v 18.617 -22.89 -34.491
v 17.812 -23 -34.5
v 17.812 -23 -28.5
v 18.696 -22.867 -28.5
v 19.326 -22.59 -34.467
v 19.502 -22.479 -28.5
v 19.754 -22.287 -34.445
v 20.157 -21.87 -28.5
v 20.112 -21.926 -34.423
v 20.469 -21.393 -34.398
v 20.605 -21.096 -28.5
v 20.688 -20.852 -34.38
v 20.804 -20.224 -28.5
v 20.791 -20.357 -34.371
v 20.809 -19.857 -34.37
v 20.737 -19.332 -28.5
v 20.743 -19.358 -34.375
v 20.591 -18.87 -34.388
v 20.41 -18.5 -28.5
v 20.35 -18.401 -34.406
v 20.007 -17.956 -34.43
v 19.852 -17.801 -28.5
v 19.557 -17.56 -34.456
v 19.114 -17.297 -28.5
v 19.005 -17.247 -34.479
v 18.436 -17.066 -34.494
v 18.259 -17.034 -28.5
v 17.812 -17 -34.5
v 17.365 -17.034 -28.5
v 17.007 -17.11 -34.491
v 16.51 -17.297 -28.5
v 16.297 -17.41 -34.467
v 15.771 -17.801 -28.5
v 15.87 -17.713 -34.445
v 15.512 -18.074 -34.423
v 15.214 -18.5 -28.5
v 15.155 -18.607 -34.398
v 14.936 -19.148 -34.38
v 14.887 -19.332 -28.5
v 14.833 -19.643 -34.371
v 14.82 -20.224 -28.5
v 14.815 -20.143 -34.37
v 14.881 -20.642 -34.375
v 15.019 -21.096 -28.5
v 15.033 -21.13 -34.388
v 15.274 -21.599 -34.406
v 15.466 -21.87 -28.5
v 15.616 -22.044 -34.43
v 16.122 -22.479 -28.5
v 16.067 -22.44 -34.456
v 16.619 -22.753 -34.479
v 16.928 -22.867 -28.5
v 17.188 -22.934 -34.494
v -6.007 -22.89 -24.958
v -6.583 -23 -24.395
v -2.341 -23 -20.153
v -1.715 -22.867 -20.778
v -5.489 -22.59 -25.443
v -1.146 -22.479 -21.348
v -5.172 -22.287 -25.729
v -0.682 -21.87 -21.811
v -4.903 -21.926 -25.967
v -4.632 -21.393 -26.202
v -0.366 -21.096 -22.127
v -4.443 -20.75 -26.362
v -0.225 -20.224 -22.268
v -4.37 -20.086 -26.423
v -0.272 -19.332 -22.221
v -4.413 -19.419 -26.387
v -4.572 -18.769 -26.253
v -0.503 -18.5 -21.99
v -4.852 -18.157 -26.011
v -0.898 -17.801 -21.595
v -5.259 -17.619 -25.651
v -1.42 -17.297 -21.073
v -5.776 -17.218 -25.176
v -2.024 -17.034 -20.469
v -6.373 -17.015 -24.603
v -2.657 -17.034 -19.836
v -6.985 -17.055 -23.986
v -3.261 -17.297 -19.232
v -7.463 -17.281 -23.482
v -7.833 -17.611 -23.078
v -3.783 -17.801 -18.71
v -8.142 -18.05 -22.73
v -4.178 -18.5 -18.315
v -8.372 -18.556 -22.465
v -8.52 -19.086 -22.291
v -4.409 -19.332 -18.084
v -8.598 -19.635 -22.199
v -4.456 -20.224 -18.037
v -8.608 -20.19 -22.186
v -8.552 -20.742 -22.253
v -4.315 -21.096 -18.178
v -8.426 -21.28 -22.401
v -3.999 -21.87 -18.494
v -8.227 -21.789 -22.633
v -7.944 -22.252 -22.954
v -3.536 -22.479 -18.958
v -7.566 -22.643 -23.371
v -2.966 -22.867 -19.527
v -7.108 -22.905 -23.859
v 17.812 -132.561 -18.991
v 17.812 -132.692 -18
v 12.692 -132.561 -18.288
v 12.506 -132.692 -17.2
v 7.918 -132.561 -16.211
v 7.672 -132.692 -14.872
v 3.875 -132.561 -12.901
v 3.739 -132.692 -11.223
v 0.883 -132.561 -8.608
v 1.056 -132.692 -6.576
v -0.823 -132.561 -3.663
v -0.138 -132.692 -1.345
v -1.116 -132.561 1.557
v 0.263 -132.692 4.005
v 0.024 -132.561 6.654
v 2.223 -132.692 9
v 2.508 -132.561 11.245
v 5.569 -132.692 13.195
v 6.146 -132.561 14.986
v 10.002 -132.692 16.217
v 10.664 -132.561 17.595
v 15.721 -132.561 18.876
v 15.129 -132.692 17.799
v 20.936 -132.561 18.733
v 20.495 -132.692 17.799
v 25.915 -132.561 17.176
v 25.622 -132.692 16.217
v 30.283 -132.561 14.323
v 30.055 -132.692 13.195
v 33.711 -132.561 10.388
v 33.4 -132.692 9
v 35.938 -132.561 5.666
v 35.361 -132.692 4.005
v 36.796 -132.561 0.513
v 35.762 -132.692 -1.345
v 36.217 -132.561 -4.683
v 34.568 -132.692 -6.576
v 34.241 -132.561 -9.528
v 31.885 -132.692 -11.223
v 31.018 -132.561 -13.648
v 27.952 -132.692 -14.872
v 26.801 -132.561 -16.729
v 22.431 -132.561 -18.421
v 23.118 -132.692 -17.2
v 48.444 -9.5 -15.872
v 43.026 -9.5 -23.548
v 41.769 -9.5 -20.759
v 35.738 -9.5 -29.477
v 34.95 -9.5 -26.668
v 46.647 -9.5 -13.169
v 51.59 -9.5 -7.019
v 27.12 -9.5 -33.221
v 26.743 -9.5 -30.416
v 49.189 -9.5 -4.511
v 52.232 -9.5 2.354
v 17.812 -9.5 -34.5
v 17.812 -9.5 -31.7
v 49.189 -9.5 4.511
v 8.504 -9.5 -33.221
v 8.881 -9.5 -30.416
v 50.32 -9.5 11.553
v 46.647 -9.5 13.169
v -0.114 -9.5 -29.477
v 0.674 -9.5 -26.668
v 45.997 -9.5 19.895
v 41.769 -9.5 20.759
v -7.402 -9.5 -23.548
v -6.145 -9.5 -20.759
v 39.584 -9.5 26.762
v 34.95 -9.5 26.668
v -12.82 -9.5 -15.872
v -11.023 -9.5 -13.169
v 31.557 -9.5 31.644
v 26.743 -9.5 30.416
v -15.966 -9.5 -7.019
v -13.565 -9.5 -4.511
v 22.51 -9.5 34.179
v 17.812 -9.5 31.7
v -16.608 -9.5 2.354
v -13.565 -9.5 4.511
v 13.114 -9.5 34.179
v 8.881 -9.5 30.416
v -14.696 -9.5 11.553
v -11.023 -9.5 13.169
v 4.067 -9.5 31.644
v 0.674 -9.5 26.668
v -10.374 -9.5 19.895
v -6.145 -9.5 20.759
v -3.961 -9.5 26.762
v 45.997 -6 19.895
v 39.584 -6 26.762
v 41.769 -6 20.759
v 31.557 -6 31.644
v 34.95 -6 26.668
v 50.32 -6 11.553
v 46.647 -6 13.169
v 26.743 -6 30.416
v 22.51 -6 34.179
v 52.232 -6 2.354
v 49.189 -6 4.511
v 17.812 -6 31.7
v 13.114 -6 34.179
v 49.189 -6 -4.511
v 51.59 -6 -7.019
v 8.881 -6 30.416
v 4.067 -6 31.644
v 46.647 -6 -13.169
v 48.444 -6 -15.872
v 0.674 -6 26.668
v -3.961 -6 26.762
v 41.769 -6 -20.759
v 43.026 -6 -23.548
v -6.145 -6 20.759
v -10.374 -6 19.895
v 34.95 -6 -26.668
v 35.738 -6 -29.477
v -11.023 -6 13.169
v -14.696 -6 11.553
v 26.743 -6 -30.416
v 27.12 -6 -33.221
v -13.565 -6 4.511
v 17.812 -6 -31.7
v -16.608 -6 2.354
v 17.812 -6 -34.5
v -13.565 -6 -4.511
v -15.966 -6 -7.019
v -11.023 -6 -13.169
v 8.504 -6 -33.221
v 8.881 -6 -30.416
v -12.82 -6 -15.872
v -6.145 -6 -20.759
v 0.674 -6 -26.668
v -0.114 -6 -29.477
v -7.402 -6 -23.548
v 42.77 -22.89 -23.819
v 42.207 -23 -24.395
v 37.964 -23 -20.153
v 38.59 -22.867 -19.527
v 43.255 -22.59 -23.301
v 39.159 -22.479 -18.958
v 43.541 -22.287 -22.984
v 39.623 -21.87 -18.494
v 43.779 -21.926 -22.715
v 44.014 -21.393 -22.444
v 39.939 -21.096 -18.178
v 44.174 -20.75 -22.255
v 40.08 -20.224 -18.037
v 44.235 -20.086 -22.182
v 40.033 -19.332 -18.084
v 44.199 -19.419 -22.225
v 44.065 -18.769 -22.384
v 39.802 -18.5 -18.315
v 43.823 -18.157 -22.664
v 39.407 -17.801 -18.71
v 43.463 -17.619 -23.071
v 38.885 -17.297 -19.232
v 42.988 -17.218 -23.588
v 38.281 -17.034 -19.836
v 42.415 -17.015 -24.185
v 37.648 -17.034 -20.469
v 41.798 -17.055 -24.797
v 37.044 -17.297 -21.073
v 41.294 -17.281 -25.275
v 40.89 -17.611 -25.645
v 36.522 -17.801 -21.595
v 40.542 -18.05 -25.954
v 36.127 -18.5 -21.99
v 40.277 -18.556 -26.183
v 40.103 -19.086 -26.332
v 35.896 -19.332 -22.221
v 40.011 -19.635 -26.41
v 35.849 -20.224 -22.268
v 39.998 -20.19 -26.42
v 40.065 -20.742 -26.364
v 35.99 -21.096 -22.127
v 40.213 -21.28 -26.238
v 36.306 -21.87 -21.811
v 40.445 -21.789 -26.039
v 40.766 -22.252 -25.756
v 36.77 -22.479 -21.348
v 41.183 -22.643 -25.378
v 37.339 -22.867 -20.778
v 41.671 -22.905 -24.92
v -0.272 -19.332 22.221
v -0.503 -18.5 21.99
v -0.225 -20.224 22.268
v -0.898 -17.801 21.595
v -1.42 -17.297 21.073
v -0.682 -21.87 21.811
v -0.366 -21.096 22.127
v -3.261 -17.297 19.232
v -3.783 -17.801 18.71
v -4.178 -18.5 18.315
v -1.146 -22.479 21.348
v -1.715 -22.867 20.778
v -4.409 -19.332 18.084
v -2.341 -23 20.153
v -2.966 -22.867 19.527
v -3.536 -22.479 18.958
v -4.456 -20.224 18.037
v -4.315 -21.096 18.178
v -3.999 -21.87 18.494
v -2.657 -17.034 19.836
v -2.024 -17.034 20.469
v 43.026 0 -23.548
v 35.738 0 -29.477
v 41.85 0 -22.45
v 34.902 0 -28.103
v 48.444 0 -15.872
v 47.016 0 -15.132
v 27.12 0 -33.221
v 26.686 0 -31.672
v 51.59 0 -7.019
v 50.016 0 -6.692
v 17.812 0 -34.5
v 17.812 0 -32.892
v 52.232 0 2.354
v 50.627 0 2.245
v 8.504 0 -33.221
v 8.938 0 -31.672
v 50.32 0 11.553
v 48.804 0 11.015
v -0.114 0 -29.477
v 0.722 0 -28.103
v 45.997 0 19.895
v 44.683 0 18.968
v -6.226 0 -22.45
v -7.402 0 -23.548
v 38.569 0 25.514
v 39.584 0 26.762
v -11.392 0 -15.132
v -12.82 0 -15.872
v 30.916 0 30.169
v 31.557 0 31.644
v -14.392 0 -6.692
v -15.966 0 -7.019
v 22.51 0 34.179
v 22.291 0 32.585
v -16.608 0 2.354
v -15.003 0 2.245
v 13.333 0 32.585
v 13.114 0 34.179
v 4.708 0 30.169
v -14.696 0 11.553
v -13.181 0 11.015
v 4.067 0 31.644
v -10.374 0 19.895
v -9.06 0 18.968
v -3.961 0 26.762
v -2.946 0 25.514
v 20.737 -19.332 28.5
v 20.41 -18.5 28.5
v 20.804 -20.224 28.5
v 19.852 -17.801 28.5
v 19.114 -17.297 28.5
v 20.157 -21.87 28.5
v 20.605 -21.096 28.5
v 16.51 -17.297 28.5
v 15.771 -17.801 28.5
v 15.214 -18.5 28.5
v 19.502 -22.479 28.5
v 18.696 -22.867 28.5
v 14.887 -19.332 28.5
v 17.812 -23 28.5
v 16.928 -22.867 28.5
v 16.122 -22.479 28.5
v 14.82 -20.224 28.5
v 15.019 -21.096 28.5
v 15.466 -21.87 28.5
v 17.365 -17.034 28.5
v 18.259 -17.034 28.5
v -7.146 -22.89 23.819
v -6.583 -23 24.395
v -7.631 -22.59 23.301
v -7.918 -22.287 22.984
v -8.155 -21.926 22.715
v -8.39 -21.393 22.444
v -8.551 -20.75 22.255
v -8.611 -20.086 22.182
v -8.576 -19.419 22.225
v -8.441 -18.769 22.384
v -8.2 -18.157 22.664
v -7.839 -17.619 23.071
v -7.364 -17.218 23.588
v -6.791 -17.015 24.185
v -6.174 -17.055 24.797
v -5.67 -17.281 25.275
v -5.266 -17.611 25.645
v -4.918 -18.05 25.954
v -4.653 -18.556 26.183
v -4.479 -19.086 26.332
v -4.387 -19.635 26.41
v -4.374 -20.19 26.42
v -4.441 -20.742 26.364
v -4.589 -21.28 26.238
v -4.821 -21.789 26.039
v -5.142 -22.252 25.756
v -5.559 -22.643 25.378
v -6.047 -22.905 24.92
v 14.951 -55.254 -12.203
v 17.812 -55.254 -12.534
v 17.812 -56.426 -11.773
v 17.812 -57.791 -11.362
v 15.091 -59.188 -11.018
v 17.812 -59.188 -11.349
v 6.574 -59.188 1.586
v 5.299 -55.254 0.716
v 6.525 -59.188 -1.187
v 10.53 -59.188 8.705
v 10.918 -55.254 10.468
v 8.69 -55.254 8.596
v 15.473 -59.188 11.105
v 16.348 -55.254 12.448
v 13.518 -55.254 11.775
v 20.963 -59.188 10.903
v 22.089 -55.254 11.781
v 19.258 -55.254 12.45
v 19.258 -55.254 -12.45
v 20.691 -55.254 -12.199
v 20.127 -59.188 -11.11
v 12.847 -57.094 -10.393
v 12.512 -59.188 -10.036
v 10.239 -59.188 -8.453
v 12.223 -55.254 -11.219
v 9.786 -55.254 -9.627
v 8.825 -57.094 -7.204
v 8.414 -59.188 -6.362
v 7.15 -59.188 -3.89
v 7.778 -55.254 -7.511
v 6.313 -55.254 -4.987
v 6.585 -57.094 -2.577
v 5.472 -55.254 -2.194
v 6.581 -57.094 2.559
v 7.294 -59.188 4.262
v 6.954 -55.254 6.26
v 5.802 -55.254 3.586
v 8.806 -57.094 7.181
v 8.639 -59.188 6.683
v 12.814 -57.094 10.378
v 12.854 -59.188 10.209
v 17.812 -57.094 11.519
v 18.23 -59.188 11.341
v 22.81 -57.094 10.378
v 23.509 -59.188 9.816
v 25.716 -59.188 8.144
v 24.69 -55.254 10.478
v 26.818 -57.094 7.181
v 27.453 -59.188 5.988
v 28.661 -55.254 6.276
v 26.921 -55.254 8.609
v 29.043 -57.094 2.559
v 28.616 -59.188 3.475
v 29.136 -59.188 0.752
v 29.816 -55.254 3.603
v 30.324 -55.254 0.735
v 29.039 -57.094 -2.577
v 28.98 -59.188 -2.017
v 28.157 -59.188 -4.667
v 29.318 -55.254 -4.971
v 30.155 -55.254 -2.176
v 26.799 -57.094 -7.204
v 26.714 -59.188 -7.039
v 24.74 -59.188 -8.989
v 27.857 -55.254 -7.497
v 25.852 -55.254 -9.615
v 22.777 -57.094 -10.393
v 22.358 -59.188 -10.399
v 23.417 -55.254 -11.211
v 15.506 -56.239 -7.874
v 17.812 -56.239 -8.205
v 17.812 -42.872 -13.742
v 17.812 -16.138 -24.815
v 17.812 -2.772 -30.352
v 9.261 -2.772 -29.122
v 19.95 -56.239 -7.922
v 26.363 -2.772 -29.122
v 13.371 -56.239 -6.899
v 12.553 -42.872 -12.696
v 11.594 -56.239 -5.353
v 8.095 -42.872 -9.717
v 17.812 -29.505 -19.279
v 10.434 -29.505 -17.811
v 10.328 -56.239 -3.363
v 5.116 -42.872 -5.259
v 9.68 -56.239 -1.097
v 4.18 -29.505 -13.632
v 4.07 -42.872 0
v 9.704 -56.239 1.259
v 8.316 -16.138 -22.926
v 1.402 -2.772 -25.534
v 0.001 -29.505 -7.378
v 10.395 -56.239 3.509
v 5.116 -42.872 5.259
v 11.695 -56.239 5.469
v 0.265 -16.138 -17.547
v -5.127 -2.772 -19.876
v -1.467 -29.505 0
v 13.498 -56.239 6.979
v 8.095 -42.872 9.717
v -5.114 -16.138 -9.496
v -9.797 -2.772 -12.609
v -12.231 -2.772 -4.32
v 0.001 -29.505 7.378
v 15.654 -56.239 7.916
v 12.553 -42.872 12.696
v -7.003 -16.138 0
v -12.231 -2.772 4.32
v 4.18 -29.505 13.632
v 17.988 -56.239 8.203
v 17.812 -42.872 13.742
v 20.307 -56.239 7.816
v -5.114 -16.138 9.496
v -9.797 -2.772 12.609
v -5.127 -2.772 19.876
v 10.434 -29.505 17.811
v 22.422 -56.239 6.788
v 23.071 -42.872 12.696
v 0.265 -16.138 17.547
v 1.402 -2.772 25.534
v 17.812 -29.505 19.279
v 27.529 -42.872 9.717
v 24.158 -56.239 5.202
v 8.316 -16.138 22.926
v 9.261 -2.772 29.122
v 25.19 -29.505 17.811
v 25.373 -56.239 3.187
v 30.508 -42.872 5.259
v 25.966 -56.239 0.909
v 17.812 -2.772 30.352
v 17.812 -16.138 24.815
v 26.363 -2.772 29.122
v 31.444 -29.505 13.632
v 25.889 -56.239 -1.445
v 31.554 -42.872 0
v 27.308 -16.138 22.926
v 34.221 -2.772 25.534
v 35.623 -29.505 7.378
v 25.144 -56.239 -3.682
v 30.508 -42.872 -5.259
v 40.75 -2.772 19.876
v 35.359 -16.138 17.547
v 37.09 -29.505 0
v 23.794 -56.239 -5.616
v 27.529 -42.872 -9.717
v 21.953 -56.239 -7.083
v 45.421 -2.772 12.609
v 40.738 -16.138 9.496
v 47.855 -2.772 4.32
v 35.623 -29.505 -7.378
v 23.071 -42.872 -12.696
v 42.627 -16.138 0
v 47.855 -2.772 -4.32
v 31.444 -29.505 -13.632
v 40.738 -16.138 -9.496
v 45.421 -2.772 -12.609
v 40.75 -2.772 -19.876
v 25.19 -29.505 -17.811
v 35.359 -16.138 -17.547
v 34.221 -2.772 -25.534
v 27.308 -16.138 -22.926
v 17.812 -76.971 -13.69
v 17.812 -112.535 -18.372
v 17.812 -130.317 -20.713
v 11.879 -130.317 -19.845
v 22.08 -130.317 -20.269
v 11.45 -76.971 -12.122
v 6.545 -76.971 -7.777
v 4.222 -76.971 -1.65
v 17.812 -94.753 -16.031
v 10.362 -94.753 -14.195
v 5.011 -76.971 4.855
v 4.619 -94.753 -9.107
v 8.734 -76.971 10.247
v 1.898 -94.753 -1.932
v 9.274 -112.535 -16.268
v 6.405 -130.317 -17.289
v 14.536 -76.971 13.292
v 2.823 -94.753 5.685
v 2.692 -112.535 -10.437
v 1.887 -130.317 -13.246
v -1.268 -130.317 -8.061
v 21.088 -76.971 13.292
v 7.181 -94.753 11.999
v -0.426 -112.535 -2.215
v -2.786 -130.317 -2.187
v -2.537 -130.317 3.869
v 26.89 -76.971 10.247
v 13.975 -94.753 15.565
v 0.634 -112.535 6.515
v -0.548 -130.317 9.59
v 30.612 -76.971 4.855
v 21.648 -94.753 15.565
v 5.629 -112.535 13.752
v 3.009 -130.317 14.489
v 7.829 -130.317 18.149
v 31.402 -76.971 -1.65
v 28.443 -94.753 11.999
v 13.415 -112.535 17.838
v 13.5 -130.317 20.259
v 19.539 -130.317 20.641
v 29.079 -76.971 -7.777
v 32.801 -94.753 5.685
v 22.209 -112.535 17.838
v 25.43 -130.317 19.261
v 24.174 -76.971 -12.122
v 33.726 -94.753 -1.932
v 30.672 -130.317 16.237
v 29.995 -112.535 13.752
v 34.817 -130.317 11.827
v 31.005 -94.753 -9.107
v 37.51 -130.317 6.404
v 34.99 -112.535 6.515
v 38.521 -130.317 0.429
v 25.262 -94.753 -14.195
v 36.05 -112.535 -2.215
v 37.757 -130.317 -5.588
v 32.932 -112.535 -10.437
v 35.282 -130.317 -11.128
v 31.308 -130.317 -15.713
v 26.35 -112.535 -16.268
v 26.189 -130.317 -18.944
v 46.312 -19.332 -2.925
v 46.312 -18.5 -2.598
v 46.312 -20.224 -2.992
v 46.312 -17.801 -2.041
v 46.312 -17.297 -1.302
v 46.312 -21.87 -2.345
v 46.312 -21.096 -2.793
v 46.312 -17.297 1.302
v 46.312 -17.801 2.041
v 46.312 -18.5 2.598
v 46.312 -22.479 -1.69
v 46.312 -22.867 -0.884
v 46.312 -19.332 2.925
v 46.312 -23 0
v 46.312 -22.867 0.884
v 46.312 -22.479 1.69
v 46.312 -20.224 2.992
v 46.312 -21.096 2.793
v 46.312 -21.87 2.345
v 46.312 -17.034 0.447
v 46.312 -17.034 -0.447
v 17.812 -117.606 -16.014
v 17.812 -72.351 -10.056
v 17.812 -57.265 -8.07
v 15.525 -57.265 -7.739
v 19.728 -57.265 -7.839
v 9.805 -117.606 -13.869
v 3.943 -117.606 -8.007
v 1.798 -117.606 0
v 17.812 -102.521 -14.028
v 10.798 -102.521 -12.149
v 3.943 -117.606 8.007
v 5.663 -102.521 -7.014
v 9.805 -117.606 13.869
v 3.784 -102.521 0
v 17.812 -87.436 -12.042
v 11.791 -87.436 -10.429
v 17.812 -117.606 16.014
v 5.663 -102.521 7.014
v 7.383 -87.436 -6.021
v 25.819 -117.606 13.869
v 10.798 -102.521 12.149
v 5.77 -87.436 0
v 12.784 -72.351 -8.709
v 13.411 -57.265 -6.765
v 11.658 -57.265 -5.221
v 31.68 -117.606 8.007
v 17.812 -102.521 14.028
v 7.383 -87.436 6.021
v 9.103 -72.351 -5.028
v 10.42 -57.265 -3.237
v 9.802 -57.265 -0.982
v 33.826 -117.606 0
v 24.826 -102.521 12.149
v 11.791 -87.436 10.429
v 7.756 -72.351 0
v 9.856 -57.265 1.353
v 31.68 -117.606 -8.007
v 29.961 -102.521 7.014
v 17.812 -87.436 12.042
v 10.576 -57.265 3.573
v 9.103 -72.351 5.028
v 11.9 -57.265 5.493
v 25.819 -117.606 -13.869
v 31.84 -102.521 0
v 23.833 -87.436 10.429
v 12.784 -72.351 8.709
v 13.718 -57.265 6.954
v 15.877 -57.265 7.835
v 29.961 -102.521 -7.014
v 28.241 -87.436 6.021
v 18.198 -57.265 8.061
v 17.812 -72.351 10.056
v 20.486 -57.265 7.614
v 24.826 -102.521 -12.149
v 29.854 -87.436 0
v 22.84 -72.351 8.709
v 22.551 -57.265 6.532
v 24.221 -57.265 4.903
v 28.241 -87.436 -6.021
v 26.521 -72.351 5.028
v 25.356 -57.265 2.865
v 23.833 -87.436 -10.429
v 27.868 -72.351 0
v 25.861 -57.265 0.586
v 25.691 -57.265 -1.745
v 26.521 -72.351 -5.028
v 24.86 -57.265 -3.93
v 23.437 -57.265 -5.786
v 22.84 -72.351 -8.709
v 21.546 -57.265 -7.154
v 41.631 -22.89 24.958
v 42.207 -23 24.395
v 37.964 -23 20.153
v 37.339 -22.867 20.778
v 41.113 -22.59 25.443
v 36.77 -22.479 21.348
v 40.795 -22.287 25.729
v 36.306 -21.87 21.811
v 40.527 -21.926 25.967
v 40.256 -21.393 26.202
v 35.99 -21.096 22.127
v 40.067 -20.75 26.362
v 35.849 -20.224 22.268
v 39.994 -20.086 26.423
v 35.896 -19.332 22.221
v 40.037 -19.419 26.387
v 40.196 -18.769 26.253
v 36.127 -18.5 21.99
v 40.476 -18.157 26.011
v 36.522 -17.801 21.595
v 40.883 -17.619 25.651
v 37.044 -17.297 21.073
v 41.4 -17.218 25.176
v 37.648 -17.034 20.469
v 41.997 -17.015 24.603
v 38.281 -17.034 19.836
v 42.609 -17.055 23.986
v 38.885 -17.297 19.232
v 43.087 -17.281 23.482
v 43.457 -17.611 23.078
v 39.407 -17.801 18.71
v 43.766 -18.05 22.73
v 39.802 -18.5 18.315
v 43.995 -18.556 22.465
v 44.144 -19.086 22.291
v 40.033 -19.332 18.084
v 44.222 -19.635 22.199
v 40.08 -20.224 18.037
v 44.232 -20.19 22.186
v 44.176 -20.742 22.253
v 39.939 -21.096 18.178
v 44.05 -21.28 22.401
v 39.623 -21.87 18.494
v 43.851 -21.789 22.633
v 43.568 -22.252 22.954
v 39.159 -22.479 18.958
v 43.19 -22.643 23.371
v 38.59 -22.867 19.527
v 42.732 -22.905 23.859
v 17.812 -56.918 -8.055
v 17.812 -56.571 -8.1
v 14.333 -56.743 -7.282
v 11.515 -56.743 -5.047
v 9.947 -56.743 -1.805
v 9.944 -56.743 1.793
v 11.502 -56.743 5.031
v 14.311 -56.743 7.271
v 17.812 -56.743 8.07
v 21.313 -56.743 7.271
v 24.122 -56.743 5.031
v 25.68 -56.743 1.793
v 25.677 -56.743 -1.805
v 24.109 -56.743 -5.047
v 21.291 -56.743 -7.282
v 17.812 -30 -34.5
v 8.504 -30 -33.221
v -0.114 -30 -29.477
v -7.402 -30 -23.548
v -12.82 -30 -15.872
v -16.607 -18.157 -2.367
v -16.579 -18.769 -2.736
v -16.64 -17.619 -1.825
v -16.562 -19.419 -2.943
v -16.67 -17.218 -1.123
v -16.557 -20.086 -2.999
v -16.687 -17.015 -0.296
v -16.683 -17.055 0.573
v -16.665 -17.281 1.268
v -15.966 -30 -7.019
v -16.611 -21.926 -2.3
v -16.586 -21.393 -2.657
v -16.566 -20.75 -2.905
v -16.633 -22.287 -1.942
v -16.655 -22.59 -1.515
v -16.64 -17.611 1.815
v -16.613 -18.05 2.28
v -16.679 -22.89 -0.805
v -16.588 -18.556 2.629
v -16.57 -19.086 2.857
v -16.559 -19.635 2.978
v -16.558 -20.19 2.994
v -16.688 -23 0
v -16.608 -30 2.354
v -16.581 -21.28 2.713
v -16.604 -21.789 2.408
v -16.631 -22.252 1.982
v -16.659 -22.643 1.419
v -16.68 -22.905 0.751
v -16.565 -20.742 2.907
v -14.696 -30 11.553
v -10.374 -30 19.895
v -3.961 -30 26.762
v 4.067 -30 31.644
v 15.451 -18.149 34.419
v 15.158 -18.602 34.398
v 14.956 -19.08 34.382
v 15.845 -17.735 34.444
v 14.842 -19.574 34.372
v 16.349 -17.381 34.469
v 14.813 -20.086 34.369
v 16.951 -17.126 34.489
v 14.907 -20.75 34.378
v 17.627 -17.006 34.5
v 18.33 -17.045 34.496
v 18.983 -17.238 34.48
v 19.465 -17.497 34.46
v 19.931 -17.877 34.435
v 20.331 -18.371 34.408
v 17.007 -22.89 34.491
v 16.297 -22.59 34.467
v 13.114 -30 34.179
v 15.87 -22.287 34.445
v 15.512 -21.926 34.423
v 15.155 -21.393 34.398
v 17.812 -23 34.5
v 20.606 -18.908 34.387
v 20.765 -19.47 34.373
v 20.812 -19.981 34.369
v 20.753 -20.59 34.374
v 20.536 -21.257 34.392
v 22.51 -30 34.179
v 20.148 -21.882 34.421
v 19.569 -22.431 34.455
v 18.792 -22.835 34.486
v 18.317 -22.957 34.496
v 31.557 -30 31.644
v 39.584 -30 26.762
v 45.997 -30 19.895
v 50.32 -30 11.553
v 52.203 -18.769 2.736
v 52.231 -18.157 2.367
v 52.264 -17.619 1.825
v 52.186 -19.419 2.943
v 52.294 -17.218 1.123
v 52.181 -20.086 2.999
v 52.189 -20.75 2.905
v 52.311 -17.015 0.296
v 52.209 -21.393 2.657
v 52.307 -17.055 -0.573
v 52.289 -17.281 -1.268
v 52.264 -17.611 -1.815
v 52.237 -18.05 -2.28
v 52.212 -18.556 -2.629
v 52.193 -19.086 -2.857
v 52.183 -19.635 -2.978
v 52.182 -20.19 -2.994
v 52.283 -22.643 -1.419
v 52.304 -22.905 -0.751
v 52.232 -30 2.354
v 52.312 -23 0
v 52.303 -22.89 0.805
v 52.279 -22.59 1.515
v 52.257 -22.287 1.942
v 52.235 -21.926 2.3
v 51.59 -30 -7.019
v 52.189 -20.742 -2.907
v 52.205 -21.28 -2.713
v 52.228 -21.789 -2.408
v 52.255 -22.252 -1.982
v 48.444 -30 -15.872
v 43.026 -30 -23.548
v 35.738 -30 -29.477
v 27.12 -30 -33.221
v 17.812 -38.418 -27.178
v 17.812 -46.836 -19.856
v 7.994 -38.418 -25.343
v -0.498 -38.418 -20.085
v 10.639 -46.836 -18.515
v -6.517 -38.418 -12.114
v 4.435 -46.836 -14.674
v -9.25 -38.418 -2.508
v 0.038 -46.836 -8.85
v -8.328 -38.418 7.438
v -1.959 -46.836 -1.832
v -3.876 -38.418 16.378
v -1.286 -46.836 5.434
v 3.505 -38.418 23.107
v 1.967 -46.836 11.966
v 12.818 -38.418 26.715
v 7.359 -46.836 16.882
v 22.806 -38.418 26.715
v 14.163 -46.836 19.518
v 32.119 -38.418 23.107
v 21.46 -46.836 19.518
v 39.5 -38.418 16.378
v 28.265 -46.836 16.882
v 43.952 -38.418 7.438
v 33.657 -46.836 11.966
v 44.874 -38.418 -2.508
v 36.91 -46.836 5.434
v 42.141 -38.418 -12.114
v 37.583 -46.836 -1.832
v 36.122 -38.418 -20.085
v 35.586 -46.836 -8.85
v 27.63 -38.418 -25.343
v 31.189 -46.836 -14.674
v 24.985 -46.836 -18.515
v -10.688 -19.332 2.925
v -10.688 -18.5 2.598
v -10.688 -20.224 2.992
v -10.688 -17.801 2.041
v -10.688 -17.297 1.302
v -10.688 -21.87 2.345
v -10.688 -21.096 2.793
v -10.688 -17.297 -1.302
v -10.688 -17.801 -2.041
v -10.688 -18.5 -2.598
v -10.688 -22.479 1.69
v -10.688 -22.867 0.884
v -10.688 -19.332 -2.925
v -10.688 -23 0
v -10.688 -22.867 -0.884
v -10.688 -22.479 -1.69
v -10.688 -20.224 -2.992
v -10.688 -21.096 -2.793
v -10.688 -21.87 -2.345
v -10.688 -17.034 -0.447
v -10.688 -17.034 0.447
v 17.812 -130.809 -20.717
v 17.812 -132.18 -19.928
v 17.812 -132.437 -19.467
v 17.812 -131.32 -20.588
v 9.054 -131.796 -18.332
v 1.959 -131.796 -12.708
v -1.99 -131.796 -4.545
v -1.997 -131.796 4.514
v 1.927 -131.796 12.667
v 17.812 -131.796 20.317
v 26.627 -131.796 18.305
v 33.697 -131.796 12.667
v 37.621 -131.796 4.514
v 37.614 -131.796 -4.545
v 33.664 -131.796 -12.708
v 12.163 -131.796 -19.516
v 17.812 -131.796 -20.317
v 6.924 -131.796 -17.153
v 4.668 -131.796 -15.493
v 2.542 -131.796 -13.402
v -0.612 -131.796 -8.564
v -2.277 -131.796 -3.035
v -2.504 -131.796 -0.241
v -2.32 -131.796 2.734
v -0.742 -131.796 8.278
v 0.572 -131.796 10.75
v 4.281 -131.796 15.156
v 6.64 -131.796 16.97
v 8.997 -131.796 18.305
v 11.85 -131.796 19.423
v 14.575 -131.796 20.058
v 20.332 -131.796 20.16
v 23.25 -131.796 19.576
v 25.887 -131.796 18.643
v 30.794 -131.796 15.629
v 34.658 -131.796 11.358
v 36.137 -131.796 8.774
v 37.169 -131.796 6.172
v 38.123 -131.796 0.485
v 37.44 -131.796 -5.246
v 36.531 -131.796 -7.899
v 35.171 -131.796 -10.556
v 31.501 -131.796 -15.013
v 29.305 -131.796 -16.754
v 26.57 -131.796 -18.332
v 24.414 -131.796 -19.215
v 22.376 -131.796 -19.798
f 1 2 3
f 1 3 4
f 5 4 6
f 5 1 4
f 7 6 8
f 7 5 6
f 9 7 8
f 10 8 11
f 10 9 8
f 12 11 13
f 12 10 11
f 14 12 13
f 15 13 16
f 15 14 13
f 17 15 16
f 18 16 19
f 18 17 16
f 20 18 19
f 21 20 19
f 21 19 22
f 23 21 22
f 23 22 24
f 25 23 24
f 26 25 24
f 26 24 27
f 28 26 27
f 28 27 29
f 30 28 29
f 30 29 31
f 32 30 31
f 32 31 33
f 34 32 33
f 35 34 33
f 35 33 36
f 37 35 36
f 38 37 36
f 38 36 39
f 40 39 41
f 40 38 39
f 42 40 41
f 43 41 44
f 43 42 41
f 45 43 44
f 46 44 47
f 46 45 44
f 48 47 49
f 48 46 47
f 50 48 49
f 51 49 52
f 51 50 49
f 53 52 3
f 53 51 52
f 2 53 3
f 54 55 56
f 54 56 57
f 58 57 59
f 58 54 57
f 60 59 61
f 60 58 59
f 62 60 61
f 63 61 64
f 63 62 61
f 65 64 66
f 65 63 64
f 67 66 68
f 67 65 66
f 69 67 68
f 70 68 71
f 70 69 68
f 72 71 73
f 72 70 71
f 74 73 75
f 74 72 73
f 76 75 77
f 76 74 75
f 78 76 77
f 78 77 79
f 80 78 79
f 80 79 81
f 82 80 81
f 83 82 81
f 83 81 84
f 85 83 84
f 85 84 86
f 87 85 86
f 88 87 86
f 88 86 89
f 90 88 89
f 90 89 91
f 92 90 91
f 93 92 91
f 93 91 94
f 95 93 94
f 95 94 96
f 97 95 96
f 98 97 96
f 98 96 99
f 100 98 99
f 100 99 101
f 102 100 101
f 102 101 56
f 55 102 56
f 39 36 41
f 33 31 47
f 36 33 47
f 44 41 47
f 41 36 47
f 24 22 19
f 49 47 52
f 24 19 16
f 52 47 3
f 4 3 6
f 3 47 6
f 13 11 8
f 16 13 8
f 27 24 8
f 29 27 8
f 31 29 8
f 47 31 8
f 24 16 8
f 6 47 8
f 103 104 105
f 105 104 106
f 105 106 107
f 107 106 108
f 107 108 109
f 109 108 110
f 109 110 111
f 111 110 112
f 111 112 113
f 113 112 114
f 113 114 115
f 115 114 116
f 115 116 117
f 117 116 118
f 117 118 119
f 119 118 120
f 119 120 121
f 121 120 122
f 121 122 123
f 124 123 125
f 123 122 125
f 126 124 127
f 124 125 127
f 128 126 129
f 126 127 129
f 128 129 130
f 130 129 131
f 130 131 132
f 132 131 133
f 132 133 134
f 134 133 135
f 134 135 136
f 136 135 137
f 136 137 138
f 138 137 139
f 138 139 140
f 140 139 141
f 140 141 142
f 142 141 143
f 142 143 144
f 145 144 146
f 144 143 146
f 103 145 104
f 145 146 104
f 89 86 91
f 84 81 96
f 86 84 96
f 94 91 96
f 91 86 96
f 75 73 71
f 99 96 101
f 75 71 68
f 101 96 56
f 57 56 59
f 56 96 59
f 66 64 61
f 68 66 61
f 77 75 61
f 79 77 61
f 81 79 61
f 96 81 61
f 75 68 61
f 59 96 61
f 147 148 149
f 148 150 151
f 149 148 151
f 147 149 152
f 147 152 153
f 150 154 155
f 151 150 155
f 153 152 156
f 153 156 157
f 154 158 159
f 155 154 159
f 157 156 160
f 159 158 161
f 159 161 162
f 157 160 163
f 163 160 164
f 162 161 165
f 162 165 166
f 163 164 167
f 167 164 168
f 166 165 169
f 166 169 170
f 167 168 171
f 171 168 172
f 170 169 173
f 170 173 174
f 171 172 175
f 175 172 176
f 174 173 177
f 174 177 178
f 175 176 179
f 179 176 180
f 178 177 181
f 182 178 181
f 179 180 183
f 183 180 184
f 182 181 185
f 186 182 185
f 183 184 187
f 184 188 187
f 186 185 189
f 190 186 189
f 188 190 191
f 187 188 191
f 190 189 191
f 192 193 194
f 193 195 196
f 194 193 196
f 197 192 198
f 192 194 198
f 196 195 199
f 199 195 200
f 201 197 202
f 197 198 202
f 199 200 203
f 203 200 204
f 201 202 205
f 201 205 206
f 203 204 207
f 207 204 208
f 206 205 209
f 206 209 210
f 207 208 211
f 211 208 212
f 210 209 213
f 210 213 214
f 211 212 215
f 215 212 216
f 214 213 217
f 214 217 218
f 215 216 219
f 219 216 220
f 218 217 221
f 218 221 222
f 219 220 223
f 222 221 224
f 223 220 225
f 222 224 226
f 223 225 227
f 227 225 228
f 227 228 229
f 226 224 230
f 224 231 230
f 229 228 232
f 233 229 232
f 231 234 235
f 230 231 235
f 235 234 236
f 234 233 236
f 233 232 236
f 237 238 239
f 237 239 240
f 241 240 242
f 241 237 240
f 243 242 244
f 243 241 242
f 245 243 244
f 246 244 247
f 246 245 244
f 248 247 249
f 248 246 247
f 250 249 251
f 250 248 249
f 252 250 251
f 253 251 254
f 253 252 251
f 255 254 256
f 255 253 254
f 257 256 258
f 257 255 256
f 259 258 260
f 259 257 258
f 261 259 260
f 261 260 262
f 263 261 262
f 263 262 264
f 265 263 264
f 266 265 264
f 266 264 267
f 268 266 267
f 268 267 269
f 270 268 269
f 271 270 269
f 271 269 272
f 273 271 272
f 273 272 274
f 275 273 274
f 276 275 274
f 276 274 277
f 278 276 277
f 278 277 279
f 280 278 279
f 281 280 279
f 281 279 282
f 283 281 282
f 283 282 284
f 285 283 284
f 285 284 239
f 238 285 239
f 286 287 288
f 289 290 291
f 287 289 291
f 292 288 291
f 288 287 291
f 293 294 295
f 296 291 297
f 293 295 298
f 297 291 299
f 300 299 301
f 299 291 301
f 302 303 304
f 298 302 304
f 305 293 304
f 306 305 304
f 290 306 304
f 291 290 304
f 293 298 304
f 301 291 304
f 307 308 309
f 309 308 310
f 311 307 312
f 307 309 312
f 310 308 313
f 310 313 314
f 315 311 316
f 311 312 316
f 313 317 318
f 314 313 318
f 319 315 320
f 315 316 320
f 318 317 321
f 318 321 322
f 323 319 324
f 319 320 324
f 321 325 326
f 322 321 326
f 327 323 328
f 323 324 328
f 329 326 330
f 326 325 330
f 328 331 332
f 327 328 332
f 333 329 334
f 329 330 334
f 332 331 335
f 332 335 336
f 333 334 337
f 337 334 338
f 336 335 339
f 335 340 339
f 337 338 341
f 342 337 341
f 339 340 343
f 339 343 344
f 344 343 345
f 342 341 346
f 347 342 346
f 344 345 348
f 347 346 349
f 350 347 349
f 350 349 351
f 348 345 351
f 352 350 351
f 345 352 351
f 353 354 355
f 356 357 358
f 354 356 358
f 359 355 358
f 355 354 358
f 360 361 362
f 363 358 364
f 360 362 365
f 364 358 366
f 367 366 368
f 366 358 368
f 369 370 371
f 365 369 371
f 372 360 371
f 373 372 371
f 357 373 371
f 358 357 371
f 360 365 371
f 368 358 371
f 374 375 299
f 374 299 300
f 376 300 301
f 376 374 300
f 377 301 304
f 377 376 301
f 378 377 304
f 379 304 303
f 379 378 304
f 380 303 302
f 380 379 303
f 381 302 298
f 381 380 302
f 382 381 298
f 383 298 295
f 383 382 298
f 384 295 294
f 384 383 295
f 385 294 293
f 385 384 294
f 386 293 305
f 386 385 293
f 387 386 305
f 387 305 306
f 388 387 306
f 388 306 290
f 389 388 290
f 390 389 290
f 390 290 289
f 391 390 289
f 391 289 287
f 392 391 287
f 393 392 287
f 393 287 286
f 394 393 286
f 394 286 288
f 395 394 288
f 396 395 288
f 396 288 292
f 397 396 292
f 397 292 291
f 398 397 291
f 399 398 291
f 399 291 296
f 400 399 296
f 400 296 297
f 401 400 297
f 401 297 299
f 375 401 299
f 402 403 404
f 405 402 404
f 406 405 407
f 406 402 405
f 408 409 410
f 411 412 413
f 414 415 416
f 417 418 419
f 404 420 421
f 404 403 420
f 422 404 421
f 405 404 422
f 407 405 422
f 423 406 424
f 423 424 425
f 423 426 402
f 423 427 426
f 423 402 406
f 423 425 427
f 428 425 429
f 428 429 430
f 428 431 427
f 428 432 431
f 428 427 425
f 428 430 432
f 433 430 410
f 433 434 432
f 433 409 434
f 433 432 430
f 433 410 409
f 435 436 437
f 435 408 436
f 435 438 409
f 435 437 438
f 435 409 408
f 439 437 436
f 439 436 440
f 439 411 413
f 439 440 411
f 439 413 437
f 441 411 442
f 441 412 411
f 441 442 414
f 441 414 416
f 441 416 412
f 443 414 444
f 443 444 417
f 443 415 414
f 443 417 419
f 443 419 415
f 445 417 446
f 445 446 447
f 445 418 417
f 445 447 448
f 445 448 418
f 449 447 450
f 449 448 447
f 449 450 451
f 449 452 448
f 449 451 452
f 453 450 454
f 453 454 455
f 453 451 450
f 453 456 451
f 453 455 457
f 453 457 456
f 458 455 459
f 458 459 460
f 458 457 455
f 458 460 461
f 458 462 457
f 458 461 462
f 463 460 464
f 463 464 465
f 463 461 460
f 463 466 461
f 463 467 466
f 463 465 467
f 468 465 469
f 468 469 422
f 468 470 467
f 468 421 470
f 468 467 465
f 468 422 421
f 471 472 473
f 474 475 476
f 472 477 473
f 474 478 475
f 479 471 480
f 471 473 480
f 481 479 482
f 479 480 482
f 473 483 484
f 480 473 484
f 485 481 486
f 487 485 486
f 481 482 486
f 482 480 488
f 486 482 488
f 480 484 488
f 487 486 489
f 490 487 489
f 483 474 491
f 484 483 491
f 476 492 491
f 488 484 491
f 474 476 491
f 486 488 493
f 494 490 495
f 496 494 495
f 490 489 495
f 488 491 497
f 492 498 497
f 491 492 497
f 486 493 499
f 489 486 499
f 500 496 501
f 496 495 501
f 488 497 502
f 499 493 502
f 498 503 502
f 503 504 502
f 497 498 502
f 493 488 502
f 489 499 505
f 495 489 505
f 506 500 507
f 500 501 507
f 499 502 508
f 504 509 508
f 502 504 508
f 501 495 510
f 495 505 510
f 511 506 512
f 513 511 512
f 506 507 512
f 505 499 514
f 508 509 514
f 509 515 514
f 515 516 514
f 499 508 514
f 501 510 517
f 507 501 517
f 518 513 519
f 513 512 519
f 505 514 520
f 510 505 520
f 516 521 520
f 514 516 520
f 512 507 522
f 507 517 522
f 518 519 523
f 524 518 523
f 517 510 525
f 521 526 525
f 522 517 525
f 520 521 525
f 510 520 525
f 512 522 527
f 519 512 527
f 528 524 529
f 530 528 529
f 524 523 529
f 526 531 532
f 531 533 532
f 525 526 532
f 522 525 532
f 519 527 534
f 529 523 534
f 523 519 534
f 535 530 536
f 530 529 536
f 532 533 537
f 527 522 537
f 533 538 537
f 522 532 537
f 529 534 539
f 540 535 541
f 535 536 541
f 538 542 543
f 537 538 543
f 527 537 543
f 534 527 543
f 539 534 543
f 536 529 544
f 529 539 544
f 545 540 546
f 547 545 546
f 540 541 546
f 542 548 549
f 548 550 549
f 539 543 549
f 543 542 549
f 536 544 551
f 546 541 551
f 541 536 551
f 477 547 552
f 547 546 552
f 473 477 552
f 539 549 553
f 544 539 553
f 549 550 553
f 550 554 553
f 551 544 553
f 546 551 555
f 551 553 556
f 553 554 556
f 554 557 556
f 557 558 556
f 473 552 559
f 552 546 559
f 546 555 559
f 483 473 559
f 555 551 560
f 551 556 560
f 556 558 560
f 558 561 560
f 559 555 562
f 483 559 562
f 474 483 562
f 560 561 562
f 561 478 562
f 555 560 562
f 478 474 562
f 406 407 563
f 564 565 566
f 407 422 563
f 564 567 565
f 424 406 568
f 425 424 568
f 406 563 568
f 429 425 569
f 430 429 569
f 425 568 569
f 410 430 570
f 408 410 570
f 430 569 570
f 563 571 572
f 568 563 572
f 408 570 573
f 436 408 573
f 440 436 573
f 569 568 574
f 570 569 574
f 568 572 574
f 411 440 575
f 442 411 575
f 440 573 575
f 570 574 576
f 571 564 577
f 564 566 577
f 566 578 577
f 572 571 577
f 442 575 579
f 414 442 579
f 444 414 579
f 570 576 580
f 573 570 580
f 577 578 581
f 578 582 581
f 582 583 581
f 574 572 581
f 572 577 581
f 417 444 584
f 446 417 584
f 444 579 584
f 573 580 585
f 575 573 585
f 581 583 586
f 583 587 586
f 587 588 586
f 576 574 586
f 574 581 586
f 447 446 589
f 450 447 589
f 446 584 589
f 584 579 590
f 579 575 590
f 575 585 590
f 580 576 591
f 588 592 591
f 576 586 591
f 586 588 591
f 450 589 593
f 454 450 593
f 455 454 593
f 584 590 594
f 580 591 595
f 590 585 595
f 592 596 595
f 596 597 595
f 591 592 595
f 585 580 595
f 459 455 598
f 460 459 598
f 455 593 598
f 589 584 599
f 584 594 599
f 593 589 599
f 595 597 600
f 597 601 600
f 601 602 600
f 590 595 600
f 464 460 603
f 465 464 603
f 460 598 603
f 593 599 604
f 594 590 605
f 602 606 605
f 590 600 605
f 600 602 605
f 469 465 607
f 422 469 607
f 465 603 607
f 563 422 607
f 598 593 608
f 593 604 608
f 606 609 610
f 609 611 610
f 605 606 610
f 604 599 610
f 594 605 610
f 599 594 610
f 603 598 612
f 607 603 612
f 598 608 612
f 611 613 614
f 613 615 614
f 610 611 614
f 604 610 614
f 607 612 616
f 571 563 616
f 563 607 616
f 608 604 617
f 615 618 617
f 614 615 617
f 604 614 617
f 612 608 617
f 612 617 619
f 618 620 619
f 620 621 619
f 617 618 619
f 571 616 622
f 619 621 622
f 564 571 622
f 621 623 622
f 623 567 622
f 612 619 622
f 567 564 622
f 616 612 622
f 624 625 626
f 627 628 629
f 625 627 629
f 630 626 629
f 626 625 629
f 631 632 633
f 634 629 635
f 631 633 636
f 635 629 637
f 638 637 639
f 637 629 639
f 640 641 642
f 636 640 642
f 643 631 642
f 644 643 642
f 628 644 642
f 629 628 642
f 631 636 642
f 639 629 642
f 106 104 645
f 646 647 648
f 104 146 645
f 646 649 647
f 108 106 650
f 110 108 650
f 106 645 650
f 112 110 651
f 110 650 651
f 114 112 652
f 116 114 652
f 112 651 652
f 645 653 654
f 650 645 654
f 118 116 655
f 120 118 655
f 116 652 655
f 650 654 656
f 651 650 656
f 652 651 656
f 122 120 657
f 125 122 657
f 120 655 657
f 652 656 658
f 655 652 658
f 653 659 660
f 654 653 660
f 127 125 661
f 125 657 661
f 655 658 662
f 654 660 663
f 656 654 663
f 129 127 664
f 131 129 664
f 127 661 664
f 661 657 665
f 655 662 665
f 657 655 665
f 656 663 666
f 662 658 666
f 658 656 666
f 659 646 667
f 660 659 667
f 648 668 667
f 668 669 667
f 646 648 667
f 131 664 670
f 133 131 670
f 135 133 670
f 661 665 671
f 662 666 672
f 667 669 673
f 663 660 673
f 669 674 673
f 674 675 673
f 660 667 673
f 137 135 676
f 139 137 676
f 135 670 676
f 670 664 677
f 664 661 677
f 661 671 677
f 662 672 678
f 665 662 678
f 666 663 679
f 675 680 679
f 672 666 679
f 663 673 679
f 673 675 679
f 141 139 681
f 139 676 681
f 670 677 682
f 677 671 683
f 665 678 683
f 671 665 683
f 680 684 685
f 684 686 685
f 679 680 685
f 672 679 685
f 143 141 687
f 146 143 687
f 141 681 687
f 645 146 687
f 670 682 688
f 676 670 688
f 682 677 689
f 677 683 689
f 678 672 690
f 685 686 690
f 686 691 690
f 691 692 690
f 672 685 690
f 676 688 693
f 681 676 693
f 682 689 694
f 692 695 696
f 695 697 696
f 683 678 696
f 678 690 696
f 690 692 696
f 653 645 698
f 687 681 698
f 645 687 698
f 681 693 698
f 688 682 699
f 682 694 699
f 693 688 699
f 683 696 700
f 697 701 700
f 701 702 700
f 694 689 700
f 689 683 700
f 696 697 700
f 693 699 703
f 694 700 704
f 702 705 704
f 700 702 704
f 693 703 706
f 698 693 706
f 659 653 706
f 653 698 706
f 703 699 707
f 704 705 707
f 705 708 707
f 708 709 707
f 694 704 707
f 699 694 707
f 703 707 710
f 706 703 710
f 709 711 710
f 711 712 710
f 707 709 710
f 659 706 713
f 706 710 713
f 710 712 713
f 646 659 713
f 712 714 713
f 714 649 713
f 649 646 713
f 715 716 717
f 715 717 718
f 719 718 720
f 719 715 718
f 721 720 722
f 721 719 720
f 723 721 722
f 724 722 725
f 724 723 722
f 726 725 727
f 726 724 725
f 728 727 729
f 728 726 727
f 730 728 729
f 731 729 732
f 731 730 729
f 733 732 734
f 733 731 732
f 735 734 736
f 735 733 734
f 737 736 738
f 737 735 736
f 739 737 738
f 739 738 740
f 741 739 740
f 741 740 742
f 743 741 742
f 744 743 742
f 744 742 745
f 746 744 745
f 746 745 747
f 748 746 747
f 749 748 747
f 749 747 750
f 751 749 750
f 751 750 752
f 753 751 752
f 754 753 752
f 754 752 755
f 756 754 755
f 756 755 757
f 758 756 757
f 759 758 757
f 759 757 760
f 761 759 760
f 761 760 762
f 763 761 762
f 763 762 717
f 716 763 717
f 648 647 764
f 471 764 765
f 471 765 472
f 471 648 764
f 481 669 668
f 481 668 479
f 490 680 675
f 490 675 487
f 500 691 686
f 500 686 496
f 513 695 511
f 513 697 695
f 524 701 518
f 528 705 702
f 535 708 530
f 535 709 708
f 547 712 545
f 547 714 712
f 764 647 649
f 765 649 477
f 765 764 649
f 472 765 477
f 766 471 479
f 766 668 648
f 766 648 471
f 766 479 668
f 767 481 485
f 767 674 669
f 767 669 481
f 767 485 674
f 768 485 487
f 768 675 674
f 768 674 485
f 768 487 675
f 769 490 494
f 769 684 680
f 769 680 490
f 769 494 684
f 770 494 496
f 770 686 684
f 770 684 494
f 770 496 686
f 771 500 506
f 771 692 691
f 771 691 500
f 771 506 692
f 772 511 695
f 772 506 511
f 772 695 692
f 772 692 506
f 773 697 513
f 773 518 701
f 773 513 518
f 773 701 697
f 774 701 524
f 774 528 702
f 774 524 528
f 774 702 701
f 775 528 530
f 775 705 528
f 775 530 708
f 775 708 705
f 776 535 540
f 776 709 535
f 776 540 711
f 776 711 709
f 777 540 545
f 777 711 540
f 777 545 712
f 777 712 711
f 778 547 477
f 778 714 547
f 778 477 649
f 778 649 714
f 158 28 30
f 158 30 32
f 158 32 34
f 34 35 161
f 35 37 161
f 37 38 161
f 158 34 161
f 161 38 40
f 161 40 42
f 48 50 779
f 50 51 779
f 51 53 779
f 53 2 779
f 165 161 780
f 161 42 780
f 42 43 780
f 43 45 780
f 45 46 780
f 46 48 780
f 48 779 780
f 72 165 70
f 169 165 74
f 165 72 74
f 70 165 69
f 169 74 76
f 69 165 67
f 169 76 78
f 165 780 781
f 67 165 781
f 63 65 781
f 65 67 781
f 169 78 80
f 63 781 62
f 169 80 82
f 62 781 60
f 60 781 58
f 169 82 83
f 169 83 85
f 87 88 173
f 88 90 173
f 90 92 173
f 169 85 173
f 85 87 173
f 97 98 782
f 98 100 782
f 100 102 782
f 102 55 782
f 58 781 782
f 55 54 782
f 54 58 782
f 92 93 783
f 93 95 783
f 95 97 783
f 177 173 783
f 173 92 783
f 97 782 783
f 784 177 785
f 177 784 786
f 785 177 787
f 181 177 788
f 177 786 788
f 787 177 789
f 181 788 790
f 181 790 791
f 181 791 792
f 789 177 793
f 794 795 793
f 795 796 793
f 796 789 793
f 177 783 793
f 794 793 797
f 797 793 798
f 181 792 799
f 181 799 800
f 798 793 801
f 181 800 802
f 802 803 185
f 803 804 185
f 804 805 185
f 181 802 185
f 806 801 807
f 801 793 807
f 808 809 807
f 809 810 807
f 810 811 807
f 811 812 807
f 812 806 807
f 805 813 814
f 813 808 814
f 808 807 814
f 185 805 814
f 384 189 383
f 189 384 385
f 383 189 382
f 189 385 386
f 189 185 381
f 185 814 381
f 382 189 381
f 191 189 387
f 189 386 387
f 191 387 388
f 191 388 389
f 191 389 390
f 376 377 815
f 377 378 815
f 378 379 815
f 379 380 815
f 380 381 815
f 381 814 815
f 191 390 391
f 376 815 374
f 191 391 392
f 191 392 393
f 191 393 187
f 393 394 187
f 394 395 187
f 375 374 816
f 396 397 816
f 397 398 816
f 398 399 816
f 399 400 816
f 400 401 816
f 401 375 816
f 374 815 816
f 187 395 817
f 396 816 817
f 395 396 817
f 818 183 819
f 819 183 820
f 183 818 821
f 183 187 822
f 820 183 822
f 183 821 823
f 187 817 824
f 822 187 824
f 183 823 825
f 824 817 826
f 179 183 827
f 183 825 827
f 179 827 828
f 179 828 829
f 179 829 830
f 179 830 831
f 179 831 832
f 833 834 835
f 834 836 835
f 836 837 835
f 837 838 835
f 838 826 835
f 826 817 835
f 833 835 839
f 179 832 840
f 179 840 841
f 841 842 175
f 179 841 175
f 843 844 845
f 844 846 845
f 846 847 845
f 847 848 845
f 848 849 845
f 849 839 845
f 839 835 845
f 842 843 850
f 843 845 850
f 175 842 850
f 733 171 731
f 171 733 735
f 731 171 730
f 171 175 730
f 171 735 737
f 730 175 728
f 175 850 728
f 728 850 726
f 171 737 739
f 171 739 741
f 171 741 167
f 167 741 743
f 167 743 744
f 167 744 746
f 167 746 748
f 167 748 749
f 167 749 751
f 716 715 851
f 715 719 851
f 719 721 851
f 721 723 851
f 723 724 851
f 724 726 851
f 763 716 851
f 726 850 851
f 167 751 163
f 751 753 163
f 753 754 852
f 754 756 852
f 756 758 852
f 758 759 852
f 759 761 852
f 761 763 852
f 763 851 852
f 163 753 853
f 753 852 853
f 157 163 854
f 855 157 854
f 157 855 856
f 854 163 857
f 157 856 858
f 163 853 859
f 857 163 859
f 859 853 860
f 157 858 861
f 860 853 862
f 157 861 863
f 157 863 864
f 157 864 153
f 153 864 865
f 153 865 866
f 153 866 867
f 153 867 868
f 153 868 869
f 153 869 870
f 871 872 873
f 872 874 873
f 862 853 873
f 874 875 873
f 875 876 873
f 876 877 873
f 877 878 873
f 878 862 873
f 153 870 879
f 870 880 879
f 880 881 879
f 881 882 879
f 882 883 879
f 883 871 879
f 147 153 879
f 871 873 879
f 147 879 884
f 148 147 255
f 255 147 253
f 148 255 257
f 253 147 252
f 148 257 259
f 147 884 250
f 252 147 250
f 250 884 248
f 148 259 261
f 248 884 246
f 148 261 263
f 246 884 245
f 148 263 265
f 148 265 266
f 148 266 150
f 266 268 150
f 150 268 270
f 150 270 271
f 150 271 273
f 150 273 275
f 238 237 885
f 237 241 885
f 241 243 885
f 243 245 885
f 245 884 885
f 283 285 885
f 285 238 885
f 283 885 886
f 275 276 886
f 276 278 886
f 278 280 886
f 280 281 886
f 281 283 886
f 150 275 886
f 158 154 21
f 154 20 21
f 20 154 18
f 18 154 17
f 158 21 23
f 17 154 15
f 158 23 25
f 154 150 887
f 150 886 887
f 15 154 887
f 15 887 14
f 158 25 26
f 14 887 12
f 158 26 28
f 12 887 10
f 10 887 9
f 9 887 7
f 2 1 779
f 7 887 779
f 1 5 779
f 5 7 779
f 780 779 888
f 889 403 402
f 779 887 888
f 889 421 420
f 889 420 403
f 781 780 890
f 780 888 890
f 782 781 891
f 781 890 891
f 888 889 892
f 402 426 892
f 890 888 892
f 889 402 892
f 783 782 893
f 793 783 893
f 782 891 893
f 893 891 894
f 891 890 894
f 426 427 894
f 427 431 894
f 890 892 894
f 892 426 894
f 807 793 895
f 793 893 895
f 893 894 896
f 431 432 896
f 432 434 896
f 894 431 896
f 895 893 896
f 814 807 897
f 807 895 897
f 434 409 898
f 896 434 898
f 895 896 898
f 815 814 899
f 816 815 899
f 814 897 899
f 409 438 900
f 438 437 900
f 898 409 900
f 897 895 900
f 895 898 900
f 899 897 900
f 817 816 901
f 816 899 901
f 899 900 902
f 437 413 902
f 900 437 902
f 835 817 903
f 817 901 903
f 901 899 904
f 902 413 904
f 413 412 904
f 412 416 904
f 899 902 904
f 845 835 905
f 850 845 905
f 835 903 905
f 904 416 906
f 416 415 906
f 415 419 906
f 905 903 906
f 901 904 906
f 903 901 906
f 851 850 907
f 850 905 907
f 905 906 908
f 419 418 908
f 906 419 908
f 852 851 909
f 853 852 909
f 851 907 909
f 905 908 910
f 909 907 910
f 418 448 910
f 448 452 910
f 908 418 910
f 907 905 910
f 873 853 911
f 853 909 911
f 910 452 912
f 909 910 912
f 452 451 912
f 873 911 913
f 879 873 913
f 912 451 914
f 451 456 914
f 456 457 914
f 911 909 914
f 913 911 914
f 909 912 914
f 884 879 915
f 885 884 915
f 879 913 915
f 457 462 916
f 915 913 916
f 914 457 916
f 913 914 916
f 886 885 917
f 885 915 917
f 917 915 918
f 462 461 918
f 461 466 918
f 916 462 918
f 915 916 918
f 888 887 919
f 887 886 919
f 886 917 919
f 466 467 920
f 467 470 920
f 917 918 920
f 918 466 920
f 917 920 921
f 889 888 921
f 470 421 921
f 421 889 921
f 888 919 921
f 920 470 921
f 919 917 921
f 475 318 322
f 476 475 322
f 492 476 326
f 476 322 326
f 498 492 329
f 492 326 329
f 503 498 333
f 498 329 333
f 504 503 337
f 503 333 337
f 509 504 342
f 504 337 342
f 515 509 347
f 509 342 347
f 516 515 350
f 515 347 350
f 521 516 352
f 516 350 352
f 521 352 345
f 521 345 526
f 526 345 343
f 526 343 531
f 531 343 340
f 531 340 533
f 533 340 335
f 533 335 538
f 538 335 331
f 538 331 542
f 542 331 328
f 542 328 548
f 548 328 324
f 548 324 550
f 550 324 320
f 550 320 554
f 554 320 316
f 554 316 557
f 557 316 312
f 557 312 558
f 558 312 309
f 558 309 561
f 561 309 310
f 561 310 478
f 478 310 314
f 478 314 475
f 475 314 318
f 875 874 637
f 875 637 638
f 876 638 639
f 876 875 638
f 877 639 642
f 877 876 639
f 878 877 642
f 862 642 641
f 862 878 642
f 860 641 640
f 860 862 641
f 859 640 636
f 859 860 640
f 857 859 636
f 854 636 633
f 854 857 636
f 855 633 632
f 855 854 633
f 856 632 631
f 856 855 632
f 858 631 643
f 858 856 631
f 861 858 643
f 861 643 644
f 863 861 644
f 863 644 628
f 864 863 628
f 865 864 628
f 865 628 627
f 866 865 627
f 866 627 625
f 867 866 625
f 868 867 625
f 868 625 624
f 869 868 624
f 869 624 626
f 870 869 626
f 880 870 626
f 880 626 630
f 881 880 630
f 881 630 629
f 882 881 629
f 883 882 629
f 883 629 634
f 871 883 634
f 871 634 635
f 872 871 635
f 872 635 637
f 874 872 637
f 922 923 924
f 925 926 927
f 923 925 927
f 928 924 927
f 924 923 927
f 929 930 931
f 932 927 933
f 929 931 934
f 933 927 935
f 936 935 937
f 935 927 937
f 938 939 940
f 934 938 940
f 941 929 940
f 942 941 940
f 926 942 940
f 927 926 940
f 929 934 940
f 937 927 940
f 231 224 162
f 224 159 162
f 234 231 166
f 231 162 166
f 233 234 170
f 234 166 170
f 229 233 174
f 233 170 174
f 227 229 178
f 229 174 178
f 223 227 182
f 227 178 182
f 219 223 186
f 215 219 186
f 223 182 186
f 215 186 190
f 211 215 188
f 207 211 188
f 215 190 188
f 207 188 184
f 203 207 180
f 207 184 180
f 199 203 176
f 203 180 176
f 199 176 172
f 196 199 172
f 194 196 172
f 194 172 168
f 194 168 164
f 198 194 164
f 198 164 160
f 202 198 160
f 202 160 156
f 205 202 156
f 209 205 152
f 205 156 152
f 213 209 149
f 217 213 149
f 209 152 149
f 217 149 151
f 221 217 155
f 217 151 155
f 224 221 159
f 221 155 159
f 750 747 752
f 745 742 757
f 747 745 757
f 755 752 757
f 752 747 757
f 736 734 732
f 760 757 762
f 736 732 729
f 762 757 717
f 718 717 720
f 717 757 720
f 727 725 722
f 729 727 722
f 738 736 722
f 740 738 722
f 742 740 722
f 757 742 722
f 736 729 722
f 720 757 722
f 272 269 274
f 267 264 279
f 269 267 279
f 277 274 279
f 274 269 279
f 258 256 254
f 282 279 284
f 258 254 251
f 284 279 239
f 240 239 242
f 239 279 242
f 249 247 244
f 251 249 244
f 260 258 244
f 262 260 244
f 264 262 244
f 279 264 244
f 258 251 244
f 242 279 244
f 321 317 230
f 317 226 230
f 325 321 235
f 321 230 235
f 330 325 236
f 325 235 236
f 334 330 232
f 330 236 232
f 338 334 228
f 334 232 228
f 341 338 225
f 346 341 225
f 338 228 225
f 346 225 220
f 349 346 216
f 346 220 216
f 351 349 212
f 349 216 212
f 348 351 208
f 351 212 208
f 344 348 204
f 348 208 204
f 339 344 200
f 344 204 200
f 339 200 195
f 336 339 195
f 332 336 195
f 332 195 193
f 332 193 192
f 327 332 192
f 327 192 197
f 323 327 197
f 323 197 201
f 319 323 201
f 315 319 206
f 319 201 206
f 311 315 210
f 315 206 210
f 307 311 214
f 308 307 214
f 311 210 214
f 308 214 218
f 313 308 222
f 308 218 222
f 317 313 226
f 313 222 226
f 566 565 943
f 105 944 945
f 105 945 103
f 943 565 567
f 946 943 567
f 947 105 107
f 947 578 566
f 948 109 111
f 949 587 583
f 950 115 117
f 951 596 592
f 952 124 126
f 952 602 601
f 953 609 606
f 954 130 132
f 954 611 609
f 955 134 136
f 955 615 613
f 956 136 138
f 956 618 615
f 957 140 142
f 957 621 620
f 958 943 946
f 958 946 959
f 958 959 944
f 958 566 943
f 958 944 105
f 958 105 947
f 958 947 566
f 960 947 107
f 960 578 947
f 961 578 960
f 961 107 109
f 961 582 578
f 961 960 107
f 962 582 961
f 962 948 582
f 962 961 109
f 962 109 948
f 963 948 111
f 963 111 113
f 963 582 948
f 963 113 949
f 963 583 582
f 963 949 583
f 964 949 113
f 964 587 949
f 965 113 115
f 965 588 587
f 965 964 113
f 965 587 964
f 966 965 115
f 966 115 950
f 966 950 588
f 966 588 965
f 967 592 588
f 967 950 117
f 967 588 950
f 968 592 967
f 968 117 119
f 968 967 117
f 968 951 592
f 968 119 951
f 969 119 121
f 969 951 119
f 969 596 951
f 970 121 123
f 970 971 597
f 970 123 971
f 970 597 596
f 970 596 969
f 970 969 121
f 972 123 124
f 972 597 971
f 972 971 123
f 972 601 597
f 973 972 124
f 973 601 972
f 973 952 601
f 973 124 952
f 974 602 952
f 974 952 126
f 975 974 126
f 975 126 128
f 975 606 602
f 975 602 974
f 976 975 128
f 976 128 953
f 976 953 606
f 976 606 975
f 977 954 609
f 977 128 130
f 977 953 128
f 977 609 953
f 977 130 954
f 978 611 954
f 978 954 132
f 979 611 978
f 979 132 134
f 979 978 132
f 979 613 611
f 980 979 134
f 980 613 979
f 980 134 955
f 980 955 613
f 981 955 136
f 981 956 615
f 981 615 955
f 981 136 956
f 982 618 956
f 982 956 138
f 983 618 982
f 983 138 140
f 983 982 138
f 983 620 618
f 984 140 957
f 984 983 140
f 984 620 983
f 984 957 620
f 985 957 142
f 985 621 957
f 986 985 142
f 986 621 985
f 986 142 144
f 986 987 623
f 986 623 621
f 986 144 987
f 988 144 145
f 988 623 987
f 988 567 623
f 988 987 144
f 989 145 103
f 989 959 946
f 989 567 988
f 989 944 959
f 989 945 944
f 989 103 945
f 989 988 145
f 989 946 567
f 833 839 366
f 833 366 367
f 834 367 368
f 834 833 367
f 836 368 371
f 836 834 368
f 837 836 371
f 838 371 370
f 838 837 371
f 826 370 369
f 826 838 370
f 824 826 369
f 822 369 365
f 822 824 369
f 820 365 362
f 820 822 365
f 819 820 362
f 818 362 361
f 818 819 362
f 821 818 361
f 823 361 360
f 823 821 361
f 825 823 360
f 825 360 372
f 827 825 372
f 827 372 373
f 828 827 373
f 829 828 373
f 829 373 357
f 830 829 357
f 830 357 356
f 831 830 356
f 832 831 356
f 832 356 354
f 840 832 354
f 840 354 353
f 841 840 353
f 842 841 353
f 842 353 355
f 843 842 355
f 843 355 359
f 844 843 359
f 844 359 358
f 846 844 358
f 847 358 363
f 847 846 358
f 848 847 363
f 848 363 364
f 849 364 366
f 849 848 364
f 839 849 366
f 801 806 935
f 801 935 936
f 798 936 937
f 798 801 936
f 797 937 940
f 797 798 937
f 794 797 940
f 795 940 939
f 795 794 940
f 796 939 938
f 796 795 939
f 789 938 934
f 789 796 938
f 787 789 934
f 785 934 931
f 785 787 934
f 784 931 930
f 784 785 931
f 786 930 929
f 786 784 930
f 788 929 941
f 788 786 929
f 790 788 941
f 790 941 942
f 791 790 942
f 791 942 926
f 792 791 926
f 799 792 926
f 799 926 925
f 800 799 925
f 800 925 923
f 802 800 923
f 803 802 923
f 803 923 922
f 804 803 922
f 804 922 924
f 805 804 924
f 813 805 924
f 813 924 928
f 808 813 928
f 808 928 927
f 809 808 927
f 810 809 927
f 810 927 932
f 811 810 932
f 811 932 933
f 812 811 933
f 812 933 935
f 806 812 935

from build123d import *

# Parameters (mm, degrees)
FILETE4_R             = 5
FILETE5_R             = 2
FILETE6_R             = 2
ESBO_O2_R             = 3
CORTE_EXTRUS_O1_DEPTH = 6
PADR_OCIRCULAR1_COUNT = 8
CHANFRO3_SIZE         = 3
CHANFRO3_SIZE2        = 1.391688553


with BuildPart() as part:
    # Esboço1 → Revolução1 (revolve)
    with BuildSketch(Plane.XY, mode=Mode.PRIVATE) as revolu_o1_sk:
        Polygon((-13.688060187, 0), (-16.688060187, 0), (-16.688060187, -6), (-13.888060187, -6), (-13.888060187, -9.5), (-16.688060187, -9.5), (-16.688060187, -30), (6.757041151, -56.954385068), (-3.162394771, -132.299981266), (-0.188060187, -132.691559843), (9.811939813, -56.734018716), align=None)
    revolve(revolu_o1_sk.sketch.rotate(Axis((17.811939813, -4.773902368, 0), (0, 1, 0)), 270), axis=Axis((17.811939813, -4.773902368, 0), (0, 1, 0)))

    # Filete4
    filete4_edges = [part.edges().sort_by_distance(p)[0] for p in [
        (17.811939813, -56.954385068, 11.054898662),
    ]]
    fillet(filete4_edges, radius=FILETE4_R)

    # Filete5
    filete5_edges = [part.edges().sort_by_distance(p)[0] for p in [
        (17.811939813, -132.299981266, 20.974334584),
    ]]
    fillet(filete5_edges, radius=FILETE5_R)

    # Filete6
    filete6_edges = [part.edges().sort_by_distance(p)[0] for p in [
        (17.811939813, -56.734018716, 8),
    ]]
    fillet(filete6_edges, radius=FILETE6_R)

    # Esboço2 → Corte-extrusão1 (cut)
    with BuildSketch(Plane.XY.offset(-34.5)):
        with Locations(Location((17.811939813, -20, 0), (0, 0, 270))):
            Circle(ESBO_O2_R)
    corte_extrus_o1 = extrude(amount=CORTE_EXTRUS_O1_DEPTH, mode=Mode.SUBTRACT)

    # PadrãoCircular1: Corte-extrusão1 ×8 about axis
    padr_ocircular1_axis = Axis((17.811939813, 0, 0), (0, 1, 0))
    for i in range(1, PADR_OCIRCULAR1_COUNT):
        add(corte_extrus_o1.rotate(padr_ocircular1_axis, i * 360 / PADR_OCIRCULAR1_COUNT), mode=Mode.SUBTRACT)

    # Chanfro3
    chanfro3_edges = [part.edges().sort_by_distance(p)[0] for p in [
        (17.811939813, 0, 31.5),
    ]]
    chanfro3_side = [part.faces().sort_by_distance(p)[0] for p in [
        (17.811939813, -28.119456583, 19.852539717),
    ]]
    chamfer(chanfro3_edges, length=CHANFRO3_SIZE, length2=CHANFRO3_SIZE2, reference=chanfro3_side[0])


solid = part.part
